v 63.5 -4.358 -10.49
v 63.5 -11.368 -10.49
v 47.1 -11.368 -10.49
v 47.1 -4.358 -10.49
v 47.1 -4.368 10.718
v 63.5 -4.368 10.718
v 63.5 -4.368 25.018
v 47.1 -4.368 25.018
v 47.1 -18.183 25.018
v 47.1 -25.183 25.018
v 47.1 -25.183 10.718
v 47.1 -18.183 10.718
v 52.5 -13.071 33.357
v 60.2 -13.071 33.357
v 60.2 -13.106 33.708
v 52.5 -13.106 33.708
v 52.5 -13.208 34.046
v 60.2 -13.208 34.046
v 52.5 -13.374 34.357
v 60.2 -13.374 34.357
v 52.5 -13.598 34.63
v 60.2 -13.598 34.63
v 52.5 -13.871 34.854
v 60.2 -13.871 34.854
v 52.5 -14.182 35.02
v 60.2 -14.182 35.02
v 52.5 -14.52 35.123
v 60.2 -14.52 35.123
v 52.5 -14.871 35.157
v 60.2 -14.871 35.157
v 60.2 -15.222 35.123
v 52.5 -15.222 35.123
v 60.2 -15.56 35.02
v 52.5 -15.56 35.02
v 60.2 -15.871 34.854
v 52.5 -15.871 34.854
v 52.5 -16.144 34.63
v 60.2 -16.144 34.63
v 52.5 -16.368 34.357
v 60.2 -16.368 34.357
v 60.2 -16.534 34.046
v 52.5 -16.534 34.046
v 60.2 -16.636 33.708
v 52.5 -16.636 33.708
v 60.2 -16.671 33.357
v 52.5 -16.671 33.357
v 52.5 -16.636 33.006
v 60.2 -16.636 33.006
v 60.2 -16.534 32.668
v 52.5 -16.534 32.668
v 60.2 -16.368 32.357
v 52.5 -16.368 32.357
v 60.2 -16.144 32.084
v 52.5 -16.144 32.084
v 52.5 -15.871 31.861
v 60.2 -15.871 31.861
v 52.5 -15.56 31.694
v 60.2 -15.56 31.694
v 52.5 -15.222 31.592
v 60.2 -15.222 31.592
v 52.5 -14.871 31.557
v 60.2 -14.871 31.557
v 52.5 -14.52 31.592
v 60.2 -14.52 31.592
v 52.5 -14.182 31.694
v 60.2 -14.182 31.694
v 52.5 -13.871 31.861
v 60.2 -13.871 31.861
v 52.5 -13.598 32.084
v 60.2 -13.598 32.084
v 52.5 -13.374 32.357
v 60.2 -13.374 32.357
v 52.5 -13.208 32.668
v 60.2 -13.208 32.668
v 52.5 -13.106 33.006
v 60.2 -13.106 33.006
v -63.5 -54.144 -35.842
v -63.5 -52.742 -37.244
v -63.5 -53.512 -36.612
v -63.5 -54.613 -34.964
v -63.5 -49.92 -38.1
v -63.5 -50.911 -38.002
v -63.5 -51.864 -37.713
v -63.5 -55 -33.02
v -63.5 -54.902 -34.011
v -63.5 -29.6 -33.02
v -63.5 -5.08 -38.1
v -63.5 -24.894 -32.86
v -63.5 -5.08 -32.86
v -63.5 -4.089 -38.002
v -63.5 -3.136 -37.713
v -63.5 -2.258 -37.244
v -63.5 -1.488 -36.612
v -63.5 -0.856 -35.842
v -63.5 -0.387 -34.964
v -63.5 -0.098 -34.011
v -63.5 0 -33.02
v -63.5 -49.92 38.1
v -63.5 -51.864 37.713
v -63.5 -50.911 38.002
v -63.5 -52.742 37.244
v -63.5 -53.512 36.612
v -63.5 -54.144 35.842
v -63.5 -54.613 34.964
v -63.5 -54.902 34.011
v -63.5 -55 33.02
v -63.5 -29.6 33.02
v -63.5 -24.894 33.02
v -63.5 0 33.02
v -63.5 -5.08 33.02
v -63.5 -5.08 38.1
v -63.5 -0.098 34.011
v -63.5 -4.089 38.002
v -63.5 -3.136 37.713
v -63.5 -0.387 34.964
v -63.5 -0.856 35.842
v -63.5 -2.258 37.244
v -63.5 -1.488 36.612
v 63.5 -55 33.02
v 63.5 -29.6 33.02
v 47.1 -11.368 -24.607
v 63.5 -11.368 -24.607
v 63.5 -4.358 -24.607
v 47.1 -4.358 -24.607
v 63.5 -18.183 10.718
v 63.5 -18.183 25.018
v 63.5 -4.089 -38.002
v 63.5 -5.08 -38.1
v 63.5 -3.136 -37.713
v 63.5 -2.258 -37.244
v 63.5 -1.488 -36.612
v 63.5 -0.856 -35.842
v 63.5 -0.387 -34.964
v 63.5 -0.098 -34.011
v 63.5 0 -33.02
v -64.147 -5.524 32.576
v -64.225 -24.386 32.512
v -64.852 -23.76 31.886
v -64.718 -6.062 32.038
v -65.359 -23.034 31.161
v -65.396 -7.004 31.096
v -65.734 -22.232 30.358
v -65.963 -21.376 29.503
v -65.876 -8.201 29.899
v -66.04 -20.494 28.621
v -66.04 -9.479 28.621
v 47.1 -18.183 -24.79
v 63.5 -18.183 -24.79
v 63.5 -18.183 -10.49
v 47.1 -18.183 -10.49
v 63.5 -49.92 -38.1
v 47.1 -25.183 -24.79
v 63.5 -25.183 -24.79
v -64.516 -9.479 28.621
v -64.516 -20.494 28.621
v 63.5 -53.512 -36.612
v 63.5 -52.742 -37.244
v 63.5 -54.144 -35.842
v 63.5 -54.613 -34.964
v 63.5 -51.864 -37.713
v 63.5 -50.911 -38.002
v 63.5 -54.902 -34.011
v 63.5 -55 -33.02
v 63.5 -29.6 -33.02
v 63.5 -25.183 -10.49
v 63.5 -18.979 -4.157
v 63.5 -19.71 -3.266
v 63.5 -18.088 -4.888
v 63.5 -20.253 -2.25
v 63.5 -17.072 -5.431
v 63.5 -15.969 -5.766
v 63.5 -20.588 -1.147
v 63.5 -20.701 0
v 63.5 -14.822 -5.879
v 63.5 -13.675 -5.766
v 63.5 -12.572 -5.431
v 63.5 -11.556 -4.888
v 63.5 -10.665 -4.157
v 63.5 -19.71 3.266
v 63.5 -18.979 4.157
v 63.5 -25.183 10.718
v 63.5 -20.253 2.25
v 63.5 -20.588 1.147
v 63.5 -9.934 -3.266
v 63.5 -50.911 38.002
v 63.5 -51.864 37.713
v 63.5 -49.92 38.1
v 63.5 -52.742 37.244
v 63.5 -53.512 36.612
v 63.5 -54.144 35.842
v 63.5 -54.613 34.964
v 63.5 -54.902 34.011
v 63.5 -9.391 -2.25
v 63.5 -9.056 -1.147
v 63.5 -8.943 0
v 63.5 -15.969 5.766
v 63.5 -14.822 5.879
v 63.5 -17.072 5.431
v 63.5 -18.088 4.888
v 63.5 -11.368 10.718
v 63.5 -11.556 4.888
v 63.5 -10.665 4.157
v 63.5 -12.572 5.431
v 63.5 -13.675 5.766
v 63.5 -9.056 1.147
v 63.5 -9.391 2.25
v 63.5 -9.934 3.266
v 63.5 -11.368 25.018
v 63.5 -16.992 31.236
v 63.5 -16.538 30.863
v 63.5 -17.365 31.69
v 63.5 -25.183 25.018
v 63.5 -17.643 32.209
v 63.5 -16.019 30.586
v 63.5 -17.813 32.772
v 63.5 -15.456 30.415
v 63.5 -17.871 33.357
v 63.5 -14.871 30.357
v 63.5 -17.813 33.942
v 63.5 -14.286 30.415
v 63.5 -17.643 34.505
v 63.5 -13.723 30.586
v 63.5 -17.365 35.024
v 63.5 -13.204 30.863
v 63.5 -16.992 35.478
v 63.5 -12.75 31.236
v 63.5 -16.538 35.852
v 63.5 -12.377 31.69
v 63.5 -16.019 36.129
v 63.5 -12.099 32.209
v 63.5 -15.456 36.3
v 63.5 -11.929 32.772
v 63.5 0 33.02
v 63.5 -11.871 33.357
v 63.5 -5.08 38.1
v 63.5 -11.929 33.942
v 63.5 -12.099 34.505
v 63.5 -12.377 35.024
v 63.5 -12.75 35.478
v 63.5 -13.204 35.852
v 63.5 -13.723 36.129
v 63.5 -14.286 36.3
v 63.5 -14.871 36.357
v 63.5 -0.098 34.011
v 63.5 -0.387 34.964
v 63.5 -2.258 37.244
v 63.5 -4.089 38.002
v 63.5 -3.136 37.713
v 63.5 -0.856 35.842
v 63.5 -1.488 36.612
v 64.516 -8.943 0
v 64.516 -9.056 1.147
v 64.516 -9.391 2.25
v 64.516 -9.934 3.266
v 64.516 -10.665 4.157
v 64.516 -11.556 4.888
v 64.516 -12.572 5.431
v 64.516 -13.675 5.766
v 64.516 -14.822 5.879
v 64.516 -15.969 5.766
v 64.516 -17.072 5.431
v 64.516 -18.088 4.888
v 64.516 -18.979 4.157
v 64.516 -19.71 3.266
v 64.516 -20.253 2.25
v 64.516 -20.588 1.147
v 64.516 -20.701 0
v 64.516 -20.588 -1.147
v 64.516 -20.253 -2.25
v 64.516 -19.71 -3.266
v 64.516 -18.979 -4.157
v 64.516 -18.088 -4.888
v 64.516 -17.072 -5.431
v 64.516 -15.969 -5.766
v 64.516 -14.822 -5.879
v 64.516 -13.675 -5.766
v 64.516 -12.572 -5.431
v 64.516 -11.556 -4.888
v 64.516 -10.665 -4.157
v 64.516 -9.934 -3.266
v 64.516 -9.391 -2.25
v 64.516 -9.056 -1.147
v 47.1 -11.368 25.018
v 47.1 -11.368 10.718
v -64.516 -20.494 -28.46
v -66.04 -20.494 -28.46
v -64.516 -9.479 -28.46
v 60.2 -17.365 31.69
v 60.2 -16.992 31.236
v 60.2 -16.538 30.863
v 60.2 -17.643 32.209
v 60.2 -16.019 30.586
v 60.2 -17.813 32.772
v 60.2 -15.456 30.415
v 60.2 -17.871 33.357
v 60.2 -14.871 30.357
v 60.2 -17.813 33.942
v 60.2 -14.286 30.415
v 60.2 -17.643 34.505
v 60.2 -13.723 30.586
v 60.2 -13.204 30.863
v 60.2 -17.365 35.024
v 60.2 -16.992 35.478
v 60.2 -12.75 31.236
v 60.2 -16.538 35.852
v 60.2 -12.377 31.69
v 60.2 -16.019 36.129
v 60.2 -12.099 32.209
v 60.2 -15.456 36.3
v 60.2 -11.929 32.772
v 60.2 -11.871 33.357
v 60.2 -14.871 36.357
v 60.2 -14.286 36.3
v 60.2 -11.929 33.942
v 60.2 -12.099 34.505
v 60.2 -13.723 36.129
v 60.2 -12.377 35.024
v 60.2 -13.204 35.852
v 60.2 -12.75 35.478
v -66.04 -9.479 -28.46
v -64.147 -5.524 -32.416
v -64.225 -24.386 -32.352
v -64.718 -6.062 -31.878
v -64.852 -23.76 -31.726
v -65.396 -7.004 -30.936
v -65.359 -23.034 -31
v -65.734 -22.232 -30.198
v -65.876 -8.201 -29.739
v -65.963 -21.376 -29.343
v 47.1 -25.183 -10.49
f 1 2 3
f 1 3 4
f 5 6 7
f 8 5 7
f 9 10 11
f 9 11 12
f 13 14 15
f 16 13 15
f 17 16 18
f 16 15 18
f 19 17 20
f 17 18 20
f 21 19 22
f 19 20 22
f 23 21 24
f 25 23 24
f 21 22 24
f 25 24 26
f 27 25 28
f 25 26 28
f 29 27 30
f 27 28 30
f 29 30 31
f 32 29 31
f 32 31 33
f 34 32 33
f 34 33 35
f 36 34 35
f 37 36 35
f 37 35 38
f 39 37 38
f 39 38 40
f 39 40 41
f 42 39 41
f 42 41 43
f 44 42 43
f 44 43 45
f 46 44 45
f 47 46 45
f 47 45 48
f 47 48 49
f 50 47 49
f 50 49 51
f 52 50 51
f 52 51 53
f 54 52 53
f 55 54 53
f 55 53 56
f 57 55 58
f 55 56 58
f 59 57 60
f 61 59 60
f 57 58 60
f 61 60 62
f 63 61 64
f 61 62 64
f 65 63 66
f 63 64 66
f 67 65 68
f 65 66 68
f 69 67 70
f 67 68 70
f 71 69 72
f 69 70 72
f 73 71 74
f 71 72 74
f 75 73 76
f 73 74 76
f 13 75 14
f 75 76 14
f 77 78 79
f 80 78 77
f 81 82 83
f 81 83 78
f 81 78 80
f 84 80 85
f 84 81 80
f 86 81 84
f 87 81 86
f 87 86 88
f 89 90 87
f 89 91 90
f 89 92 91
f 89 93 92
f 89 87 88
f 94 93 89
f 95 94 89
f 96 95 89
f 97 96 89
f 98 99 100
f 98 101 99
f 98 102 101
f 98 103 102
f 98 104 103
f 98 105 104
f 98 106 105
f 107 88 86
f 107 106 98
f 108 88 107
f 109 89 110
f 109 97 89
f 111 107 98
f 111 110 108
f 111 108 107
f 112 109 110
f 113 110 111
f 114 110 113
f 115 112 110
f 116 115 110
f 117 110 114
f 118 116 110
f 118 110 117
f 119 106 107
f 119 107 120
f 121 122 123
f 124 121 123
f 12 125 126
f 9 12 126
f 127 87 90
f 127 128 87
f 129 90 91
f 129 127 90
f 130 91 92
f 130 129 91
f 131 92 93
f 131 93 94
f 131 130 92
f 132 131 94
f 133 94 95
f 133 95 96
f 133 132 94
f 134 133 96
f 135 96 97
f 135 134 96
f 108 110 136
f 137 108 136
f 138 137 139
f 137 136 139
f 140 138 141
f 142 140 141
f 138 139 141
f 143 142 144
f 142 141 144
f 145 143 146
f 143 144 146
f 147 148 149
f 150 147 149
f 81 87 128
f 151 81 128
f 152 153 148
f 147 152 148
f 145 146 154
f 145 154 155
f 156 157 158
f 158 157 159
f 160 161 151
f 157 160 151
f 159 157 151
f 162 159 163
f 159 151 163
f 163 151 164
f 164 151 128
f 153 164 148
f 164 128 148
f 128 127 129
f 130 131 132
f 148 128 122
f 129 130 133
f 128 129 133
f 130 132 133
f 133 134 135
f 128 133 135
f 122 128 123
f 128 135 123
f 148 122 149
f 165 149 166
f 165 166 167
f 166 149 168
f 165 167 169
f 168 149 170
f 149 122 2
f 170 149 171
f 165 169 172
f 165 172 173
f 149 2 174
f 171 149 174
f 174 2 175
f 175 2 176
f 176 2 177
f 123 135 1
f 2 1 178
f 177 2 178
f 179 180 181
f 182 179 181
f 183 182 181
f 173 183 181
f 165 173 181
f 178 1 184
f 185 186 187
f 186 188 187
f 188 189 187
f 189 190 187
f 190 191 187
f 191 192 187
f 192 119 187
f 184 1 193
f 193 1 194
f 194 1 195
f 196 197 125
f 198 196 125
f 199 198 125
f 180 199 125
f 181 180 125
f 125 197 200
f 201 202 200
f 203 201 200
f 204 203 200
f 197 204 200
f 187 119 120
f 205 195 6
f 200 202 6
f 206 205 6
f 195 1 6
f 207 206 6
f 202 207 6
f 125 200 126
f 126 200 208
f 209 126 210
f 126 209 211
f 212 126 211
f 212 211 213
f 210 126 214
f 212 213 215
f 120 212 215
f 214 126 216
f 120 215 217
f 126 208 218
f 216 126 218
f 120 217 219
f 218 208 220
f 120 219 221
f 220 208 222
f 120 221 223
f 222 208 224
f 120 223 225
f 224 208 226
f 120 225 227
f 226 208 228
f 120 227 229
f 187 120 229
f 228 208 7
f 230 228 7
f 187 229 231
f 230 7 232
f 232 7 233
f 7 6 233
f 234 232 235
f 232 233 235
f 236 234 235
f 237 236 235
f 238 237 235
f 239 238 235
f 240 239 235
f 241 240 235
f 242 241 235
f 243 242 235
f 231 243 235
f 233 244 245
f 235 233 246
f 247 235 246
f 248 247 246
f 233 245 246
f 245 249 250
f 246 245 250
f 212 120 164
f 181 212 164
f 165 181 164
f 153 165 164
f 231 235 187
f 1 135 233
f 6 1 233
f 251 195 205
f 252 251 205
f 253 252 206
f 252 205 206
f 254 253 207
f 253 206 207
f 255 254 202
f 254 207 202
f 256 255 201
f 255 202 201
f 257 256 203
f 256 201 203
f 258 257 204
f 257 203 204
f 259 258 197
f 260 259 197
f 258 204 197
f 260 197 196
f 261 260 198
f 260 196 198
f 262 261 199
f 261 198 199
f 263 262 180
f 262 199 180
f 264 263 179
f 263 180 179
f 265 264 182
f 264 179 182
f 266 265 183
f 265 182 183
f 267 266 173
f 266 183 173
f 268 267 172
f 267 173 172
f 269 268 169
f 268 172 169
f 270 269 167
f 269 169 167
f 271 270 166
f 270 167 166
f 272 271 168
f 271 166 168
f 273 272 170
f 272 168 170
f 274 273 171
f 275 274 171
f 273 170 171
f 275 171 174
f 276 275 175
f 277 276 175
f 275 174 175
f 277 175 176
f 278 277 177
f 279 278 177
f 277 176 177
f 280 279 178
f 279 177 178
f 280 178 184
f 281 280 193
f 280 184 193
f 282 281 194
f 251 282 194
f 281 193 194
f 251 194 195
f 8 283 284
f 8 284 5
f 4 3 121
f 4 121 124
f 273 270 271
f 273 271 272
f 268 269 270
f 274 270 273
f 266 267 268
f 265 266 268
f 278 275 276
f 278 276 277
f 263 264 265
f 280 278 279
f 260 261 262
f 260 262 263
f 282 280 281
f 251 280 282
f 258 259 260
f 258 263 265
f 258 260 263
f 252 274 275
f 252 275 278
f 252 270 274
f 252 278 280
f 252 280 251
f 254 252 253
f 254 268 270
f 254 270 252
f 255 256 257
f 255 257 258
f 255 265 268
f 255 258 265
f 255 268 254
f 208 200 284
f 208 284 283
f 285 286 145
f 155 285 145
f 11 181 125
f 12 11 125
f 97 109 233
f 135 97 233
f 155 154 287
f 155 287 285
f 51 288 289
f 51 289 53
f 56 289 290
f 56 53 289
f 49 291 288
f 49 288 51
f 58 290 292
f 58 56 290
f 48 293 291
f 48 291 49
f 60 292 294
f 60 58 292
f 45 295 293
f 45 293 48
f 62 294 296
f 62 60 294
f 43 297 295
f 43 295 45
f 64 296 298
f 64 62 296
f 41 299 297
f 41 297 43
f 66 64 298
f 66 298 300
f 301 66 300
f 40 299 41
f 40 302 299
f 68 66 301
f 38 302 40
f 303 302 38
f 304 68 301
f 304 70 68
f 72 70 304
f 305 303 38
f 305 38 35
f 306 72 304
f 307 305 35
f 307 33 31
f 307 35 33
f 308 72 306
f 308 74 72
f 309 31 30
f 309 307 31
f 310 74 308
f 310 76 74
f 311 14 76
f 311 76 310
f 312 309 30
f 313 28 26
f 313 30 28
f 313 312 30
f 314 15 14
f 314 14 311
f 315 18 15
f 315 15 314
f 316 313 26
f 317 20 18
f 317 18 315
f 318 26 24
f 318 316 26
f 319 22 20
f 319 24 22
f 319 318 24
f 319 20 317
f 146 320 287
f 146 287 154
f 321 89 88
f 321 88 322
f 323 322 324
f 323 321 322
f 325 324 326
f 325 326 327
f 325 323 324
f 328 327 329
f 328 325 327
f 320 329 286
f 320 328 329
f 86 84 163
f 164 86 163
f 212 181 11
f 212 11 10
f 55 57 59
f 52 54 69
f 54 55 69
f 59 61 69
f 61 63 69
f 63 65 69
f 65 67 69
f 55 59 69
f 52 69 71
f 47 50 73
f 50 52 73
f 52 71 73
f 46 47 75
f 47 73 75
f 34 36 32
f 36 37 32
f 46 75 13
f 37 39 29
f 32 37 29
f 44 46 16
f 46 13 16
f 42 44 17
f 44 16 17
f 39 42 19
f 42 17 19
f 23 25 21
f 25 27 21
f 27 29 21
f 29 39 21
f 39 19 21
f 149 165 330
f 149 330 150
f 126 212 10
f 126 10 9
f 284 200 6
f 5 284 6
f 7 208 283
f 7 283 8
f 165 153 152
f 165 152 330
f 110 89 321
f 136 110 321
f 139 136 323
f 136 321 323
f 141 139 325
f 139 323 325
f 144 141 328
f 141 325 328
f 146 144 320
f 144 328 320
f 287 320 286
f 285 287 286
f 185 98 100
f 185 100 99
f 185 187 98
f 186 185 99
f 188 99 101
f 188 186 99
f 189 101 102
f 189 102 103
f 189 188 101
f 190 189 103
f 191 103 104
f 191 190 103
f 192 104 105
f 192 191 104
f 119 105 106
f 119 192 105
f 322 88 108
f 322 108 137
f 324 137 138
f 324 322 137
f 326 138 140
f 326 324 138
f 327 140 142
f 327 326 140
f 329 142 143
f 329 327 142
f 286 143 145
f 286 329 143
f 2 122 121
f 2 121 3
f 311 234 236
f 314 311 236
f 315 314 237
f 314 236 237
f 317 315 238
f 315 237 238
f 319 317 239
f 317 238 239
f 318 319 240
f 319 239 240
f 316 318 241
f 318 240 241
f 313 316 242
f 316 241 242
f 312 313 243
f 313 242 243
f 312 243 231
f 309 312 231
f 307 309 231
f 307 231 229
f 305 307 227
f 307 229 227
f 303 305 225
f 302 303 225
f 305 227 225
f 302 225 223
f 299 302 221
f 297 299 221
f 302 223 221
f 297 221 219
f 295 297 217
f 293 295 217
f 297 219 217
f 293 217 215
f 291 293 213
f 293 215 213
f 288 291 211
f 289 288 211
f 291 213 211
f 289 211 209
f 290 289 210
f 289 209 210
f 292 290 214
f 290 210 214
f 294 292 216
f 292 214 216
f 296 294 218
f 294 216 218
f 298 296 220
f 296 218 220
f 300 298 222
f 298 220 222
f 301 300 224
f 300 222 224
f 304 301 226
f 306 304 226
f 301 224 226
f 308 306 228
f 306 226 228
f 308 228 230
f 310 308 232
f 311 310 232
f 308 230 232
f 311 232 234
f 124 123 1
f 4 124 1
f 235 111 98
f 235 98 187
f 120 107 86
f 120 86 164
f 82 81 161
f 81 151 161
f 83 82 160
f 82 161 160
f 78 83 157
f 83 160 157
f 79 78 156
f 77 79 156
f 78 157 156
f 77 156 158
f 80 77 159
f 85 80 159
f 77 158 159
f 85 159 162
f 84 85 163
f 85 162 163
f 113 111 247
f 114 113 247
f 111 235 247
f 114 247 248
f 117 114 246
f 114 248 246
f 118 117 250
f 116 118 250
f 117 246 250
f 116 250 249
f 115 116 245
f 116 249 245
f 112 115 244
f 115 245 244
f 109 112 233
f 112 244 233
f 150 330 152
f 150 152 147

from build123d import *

# Parameters (mm, degrees)
F0_W         = 127
F0_H         = 76.2
F1_DEPTH     = 55
F2_R         = 5.08
F3_W         = 7
F3_H         = 14.3
F4_DEPTH     = 16.4
F5_DEPTH     = 25.4
F6_W         = 7
F6_H         = 14.3
F6_W_2       = 7.0104
F6_H_2       = 14.117781591
F7_DEPTH     = 16.4
F9_W         = 19.8135651034
F9_H         = 65.8797910702
F10_DEPTH    = 2.54
F11_T1_DEPTH = 87.8768363263
F11_T3_DEPTH = 41.8106103595
F12_DEPTH    = 1.524
F13_R        = 3
F13_R_2      = 1.8
F14_DEPTH    = 3.3
F15_DEPTH    = 11
F8_R         = 5.878920021
F16_DEPTH    = 1.016


# Not quite as in the source:
# - a fillet or chamfer that OpenCascade refuses, or shapes differently, is made with other operations: its cross-section is extruded or revolved along the edge and cut away or added


with BuildPart() as f1:
    # F0 (on Front) → F1 (new body)
    with BuildSketch(Plane.XZ):
        Rectangle(F0_W, F0_H)
    extrude(amount=F1_DEPTH)

    # F2
    f2_edges = [f1.edges().sort_by_distance(p)[0] for p in [
        (0, -55, -38.1),
        (0, 0, -38.1),
        (0, -55, 38.1),
        (0, 0, 38.1),
    ]]
    fillet(f2_edges, radius=F2_R)

    # F3 (on face) → F4 (cut)
    with BuildSketch(Plane.YZ.offset(63.5)):
        with Locations((-49.3123565018, 17.8676303864)):
            Rectangle(F3_W, F3_H)
        with Locations((-35.2098751962, 17.8676303864)):
            Rectangle(F3_W, F3_H)
        with Locations((-21.6830033958, 17.8676303864)):
            Rectangle(F3_W, F3_H)
        with Locations((-7.8683277741, 17.8676303864)):
            Rectangle(F3_W, F3_H)
    extrude(amount=-F4_DEPTH, mode=Mode.SUBTRACT)

    # F5 (cut): a face of the model
    f5_faces = [f1.faces().sort_by_distance(p)[0] for p in [
        (0, -55, 0),
    ]]
    extrude(f5_faces, amount=-F5_DEPTH, mode=Mode.SUBTRACT)

    # F6 (on face) → F7 (cut)
    with BuildSketch(Plane.YZ.offset(63.5)):
        with Locations((-21.6830033958, -17.639610437)):
            Rectangle(F6_W, F6_H)
        with Locations((-7.8631268428, -17.5485012325)):
            Rectangle(F6_W_2, F6_H_2)
    extrude(amount=-F7_DEPTH, mode=Mode.SUBTRACT)

    # F9 (on face) → F10 (join)
    with BuildSketch(Plane(origin=(-63.5, 0, 0), x_dir=(0, -1, 0), z_dir=(-1, 0, 0))):
        with Locations((14.9867825517, 0.0801044649)):
            Rectangle(F9_W, F9_H)
    extrude(amount=F10_DEPTH)

    # F11: fillet of radius 5.08 on 4 edges, made by hand

    # F11_s2 → F11_t1 (cut)
    with BuildSketch(Plane.XY.offset(-43.8583136983)):
        with BuildLine():
            ThreePointArc((-63.5, -24.8935651034), (-65.3594090512, -23.0341560522), (-66.04, -20.4941560522))
            Line((-66.04, -20.4941560522), (-66.04, -24.8935651034))
            Line((-66.04, -24.8935651034), (-63.5, -24.8935651034))
        make_face()
        with BuildLine():
            ThreePointArc((-63.5, -5.08), (-65.3594090512, -6.9394090512), (-66.04, -9.4794090512))
            Line((-66.04, -9.4794090512), (-66.04, -5.08))
            Line((-66.04, -5.08), (-63.5, -5.08))
        make_face()
    extrude(amount=F11_T1_DEPTH, mode=Mode.SUBTRACT)

    # F11_s4 → F11_t3 (cut)
    with BuildSketch(Plane.XZ.offset(-5.9185226281)):
        with BuildLine():
            ThreePointArc((-63.5, 33.02), (-65.3594090512, 31.1605909488), (-66.04, 28.6205909488))
            Line((-66.04, 28.6205909488), (-66.04, 33.02))
            Line((-66.04, 33.02), (-63.5, 33.02))
        make_face()
        with BuildLine():
            ThreePointArc((-63.5, -32.8597910702), (-65.3594090512, -31.000382019), (-66.04, -28.460382019))
            Line((-66.04, -28.460382019), (-66.04, -32.8597910702))
            Line((-66.04, -32.8597910702), (-63.5, -32.8597910702))
        make_face()
    extrude(amount=F11_T3_DEPTH, mode=Mode.SUBTRACT)

    # F12 (cut): a face of the model
    f12_faces = [f1.faces().sort_by_distance(p)[0] for p in [
        (-66.04, -14.9867825517, 0.0801044649),
    ]]
    extrude(f12_faces, amount=-F12_DEPTH, mode=Mode.SUBTRACT)

    # F13 (on face) → F14 (cut)
    with BuildSketch(Plane.YZ.offset(63.5)):
        with Locations((-14.8709248751, 33.3571620286)):
            Circle(F13_R)
        with Locations((-14.8709248751, 33.3571620286)):
            Circle(F13_R_2, mode=Mode.SUBTRACT)
    extrude(amount=-F14_DEPTH, mode=Mode.SUBTRACT)

    # F15 (cut): a face of the model
    f15_faces = [f1.faces().sort_by_distance(p)[0] for p in [
        (63.5, -14.8709248751, 33.3571620286),
    ]]
    extrude(f15_faces, amount=-F15_DEPTH, mode=Mode.SUBTRACT)

    # F8 (on face) → F16 (join)
    with BuildSketch(Plane.YZ.offset(63.5)):
        with Locations((-14.821995981, 0)):
            Circle(F8_R)
    extrude(amount=F16_DEPTH)


solid = f1.part
